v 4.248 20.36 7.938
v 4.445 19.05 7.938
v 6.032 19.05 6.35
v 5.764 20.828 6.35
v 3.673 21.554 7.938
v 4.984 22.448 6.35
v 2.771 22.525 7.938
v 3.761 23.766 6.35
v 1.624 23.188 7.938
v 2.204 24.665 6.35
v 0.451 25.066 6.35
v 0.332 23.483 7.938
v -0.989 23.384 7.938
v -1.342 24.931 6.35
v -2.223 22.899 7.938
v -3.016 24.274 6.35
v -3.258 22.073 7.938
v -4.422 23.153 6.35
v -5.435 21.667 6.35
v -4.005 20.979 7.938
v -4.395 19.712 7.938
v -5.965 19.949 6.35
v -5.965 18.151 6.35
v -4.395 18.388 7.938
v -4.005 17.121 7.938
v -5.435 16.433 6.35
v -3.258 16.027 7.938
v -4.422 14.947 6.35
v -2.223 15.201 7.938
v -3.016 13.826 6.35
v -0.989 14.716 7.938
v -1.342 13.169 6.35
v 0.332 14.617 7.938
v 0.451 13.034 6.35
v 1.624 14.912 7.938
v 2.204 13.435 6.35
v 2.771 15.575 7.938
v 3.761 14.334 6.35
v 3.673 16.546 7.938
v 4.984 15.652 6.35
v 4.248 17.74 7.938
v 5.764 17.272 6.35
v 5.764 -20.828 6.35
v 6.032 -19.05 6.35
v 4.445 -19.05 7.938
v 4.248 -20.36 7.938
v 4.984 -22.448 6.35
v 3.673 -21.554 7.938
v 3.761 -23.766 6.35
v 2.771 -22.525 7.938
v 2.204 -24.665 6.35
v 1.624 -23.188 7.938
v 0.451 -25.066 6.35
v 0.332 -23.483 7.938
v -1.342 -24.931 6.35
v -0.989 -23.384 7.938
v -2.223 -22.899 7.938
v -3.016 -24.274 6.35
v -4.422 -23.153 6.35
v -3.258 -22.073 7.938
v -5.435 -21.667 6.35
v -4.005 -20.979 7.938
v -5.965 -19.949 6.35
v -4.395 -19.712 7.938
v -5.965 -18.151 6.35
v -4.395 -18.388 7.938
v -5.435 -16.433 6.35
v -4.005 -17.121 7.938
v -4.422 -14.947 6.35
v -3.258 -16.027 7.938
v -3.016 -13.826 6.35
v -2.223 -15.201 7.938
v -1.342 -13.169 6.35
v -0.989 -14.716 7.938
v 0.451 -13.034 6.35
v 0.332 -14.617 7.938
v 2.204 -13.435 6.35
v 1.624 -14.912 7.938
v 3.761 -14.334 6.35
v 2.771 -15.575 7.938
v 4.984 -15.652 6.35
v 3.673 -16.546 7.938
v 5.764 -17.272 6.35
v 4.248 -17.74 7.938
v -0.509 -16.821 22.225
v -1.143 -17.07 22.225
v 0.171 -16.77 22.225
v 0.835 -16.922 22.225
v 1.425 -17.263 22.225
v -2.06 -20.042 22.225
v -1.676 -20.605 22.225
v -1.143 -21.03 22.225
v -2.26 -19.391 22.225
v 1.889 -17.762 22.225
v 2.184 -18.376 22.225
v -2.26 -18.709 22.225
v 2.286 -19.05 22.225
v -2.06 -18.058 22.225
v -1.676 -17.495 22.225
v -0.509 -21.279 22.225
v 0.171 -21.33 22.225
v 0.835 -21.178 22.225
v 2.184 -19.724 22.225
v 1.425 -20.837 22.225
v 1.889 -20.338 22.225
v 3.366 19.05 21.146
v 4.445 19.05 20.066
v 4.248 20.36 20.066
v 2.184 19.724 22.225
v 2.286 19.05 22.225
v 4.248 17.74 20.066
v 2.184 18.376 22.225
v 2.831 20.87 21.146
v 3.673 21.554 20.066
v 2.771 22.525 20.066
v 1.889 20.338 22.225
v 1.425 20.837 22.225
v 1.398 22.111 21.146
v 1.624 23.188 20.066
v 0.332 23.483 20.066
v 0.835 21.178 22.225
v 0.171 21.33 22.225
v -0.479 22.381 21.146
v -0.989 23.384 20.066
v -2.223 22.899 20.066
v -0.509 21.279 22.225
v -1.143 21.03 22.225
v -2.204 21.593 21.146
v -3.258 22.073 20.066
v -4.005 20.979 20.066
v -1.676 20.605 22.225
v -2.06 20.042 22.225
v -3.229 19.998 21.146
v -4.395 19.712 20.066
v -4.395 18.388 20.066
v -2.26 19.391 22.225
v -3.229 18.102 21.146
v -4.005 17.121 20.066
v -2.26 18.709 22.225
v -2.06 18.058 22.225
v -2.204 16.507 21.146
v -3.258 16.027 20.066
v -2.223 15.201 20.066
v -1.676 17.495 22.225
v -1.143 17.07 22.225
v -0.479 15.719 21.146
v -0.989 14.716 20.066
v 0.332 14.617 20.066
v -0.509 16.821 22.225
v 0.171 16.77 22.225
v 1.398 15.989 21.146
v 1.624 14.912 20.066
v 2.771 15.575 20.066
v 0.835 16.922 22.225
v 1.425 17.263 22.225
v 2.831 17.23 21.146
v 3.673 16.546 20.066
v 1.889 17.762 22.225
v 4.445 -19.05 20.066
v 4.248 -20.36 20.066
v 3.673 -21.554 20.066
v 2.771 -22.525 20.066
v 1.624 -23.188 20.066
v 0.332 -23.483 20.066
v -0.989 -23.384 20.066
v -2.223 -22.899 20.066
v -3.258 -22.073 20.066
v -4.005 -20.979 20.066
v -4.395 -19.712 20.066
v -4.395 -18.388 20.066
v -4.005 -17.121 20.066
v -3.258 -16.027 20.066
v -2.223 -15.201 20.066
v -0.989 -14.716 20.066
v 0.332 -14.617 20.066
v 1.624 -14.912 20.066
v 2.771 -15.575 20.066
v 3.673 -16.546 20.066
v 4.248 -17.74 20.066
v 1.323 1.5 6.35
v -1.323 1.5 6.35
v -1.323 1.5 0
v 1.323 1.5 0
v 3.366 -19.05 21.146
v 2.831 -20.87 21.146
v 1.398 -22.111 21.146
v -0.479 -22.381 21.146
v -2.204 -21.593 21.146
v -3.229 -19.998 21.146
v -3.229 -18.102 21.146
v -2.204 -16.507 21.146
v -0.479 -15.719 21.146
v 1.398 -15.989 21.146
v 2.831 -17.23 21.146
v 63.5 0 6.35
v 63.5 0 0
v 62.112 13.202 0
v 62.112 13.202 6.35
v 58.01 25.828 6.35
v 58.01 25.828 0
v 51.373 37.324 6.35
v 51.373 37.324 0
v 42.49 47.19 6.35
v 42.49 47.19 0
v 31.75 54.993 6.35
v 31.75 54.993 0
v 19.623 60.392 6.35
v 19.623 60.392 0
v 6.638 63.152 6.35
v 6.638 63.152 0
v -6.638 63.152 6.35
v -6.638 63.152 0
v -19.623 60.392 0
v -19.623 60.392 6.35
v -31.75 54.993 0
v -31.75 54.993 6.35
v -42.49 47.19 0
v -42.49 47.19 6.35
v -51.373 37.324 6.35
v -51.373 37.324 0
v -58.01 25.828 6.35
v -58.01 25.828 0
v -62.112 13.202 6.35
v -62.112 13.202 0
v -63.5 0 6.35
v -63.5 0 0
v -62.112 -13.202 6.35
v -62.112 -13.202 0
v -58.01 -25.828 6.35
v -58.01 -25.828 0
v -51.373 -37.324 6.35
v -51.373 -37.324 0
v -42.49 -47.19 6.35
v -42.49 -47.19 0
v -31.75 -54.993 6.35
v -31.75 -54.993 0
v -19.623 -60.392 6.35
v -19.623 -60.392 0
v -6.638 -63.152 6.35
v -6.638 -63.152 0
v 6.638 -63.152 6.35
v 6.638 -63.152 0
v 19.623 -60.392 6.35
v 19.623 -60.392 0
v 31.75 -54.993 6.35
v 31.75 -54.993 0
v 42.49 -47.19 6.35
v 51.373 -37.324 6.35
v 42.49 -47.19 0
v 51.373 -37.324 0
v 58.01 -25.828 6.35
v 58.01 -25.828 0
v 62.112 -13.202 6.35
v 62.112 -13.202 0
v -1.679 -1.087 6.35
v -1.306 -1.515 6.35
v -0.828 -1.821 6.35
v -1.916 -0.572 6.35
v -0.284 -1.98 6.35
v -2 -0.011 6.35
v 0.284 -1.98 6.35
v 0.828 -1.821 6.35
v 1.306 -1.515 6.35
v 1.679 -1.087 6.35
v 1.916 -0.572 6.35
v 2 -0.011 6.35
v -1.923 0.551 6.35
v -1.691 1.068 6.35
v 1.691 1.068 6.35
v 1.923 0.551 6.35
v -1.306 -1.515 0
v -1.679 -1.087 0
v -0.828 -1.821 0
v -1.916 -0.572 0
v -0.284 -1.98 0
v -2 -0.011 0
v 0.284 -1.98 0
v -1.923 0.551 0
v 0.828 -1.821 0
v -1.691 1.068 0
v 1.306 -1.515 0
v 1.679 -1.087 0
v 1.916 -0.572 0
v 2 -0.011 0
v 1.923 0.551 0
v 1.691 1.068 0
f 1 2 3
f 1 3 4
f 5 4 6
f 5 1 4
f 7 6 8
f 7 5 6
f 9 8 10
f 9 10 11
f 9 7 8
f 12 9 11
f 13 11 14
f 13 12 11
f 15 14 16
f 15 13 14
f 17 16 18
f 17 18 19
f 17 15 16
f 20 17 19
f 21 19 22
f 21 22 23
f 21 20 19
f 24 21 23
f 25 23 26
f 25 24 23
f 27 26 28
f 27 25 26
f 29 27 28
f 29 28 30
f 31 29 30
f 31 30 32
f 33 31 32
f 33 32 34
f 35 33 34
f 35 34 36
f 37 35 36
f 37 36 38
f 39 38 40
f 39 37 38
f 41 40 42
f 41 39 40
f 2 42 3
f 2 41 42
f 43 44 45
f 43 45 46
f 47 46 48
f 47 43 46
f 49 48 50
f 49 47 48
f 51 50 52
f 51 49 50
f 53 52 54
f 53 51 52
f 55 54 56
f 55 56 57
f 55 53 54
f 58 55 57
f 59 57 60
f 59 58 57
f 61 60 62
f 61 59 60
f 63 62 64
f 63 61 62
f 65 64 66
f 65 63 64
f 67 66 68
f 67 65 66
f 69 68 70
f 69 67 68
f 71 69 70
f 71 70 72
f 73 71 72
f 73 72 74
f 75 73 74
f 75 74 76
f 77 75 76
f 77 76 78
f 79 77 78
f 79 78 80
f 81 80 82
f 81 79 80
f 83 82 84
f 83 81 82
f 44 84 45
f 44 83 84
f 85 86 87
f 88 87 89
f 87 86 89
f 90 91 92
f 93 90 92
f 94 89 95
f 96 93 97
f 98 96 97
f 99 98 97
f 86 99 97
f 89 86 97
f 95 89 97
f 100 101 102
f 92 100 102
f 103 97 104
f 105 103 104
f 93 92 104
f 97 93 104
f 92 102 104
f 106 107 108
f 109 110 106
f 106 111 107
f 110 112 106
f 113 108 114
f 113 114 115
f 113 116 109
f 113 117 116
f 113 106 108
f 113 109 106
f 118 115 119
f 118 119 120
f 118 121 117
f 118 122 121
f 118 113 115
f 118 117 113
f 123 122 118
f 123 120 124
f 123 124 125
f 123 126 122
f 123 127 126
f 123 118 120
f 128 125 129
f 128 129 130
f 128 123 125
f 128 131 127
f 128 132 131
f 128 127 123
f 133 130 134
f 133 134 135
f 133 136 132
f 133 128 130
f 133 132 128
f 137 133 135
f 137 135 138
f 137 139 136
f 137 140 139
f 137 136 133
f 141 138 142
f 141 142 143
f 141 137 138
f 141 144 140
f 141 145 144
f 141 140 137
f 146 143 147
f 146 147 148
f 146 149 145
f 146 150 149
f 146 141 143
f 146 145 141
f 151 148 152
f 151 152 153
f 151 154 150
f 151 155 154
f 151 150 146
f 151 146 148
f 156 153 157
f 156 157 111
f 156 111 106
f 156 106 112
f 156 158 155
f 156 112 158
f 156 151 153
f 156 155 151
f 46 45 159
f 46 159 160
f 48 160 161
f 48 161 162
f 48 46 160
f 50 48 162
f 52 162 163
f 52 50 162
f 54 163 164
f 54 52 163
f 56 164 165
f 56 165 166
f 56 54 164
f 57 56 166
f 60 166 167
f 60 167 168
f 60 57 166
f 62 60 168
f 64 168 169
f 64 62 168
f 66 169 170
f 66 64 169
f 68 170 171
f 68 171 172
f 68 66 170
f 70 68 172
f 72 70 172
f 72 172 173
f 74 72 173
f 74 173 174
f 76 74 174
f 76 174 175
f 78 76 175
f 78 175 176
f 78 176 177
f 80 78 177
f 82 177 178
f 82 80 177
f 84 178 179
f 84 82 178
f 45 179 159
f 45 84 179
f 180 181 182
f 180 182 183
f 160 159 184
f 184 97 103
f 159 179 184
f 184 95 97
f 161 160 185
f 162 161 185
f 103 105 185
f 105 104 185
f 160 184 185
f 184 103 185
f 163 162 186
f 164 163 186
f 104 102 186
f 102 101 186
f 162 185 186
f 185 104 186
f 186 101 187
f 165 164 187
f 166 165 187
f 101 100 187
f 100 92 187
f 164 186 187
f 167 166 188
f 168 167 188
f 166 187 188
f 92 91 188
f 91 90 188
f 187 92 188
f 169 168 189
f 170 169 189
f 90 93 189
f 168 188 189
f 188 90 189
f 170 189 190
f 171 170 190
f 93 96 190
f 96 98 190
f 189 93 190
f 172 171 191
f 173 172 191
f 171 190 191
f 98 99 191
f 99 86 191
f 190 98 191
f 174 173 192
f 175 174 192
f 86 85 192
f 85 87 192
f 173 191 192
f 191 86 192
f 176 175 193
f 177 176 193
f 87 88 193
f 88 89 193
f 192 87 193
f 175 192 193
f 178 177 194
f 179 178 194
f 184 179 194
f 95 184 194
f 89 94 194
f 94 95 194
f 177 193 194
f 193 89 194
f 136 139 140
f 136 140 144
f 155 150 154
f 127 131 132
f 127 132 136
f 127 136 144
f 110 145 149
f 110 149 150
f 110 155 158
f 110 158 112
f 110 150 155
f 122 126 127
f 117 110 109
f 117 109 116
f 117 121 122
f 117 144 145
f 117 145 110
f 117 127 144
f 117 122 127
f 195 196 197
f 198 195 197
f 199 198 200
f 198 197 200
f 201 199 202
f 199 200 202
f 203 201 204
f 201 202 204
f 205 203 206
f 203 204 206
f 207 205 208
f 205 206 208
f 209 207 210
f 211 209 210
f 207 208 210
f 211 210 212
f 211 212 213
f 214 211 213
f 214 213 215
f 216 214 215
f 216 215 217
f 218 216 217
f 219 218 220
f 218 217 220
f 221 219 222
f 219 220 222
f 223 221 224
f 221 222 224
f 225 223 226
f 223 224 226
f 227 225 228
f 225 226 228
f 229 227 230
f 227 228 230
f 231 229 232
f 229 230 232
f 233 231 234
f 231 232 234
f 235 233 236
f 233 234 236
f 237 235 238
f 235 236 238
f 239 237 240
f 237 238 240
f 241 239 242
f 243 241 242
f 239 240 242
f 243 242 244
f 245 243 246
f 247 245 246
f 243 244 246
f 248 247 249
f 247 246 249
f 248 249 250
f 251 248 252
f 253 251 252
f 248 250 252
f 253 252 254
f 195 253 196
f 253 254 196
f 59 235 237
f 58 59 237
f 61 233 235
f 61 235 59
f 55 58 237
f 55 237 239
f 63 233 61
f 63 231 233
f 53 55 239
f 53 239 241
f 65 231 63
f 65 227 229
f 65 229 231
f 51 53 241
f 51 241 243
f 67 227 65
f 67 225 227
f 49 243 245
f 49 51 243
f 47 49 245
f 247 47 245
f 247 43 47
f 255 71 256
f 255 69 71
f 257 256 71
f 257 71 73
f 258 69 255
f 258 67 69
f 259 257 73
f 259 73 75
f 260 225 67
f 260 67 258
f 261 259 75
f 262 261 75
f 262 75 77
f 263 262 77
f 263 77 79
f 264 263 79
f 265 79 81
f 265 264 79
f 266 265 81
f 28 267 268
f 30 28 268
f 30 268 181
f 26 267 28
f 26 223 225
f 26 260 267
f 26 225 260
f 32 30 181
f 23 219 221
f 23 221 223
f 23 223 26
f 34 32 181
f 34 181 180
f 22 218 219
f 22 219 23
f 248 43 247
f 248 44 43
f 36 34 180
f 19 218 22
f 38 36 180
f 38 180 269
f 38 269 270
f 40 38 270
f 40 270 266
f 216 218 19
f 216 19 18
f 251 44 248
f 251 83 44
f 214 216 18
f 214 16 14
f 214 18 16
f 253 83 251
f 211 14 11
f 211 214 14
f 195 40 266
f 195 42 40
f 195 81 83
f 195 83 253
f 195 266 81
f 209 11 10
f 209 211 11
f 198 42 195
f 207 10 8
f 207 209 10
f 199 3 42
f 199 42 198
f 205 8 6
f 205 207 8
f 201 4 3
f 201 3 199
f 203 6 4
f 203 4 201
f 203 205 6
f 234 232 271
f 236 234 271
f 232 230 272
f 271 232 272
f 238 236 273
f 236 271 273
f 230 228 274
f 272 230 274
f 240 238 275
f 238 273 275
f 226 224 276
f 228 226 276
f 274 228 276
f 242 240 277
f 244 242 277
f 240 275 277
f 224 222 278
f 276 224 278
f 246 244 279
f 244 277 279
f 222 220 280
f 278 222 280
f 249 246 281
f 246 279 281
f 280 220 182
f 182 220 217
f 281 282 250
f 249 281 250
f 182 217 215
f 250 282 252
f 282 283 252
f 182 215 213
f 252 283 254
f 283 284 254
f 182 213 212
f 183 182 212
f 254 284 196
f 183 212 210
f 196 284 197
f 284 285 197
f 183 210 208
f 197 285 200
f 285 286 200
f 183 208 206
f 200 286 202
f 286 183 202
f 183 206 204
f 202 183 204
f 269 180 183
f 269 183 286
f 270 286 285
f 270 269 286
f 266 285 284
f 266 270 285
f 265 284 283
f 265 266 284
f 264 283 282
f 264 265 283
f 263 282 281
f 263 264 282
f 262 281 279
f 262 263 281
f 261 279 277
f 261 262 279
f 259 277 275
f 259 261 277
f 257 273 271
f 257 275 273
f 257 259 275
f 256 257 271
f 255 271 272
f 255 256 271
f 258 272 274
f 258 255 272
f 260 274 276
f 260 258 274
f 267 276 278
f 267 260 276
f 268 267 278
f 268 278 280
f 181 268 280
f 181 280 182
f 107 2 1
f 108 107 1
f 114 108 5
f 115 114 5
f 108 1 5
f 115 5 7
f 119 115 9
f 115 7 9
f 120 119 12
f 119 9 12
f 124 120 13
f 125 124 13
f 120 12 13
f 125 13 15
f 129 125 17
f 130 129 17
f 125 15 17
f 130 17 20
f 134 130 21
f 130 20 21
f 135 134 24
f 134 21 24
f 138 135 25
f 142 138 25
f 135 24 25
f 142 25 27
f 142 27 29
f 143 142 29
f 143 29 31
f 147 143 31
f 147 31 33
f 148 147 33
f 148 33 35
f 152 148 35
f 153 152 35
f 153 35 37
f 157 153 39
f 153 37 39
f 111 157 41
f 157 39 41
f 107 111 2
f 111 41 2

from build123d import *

# Parameters (mm, degrees)
SKETCH1_R           = 63.5
BOSS_EXTRUDE1_DEPTH = 6.35
CUT_EXTRUDE1_DEPTH  = 91.02678768
SKETCH4_R           = 4.445
BOSS_EXTRUDE2_DEPTH = 15.875
CHAMFER2_SIZE       = 2.159
CHAMFER3_SIZE       = 1.5875


with BuildPart() as part:
    # Sketch1 → Boss-Extrude1 (new body)
    with BuildSketch(Plane.XY):
        Circle(SKETCH1_R)
    extrude(amount=BOSS_EXTRUDE1_DEPTH)

    # Sketch3 → Cut-Extrude1 (cut, through all)
    with BuildSketch(Plane.XY.offset(6.35)):
        with BuildLine():
            Line((-1.322875656, 1.5), (1.322875656, 1.5))
            ThreePointArc((1.322875656, 1.5), (0, -2), (-1.322875656, 1.5))
        make_face()
    extrude(amount=-CUT_EXTRUDE1_DEPTH, mode=Mode.SUBTRACT)

    # Sketch4 → Boss-Extrude2 (add)
    with BuildSketch(Plane.XY.offset(6.35)):
        with Locations((0, 19.05)):
            Circle(SKETCH4_R)
    boss_extrude2 = extrude(amount=BOSS_EXTRUDE2_DEPTH)

    # Mirror3: Boss-Extrude2 across plane
    add(boss_extrude2.mirror(Plane.ZX))

    # Chamfer2
    chamfer2_edges = [part.edges().sort_by_distance(p)[0] for p in [
        (-4.445, 19.05, 22.225),
        (-4.445, -19.05, 22.225),
    ]]
    chamfer(chamfer2_edges, length=CHAMFER2_SIZE)

    # Chamfer3
    chamfer3_edges = [part.edges().sort_by_distance(p)[0] for p in [
        (-4.445, 19.05, 6.35),
        (-4.445, -19.05, 6.35),
    ]]
    chamfer(chamfer3_edges, length=CHAMFER3_SIZE)


solid = part.part
